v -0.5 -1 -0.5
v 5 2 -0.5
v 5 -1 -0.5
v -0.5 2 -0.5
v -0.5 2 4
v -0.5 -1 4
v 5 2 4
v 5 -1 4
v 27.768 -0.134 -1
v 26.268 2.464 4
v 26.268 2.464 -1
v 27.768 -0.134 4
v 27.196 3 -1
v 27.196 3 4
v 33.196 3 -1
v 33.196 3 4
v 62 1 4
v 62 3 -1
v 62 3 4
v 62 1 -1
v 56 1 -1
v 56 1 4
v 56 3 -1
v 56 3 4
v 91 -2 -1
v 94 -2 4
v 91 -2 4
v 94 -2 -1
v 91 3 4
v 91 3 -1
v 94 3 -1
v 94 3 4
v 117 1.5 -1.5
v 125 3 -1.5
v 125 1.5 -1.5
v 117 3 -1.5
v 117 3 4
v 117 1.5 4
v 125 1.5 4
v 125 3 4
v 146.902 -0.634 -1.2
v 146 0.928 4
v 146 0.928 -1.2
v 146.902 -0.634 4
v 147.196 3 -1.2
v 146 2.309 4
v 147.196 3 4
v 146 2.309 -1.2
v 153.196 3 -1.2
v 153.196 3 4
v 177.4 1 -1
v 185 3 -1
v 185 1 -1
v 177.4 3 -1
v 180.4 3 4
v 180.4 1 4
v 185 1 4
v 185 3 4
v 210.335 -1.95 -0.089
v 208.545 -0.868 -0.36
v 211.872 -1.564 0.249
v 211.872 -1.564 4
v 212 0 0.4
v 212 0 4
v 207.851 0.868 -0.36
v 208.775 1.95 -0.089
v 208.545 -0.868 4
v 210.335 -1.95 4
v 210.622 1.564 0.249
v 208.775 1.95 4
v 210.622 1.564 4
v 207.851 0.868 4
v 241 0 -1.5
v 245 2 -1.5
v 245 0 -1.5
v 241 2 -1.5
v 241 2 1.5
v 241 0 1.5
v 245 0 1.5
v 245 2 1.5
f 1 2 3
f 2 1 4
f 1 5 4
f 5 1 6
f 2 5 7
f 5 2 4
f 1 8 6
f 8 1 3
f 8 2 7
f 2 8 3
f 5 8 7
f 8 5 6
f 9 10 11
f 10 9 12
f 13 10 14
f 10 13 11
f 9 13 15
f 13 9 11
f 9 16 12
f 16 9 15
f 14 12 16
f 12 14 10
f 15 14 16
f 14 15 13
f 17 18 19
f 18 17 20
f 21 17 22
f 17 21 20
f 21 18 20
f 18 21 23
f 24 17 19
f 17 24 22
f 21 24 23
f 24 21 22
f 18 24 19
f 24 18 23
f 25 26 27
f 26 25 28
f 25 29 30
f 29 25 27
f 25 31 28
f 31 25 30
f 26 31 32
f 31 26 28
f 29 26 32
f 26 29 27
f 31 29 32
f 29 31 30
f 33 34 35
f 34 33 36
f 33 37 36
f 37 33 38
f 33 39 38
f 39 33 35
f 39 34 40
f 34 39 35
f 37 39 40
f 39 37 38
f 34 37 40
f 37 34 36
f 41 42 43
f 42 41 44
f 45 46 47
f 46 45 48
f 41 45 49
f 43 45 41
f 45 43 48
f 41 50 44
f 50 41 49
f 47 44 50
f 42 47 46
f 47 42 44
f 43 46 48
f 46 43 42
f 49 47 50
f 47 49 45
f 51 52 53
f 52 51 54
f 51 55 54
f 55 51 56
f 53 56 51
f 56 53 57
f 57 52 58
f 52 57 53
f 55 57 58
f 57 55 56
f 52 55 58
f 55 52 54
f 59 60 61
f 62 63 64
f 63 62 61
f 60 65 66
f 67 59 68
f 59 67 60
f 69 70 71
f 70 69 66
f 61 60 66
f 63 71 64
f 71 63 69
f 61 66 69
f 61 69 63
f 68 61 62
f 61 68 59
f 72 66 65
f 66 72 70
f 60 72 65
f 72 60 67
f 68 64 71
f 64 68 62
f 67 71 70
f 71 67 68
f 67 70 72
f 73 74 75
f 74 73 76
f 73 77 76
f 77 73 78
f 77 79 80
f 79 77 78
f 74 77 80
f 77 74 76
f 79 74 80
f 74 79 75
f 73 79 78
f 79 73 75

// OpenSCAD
// multmatrix(m) of plain numbers (affine.ts): each result is clipped by a box lopsided on every axis, so the
// clipped volume depends on the orientation, the handedness and the scale — not just the size
module block() translate([-2, 1, -1]) cube([8, 3, 6]);
module clip(at) translate([at, 0, 0]) intersection() { children(); translate([-4, -6, -3]) cube([9, 9, 7]); }
clip(0) multmatrix([[1, 0, 0, 1.5], [0, 1, 0, -2], [0, 0, 1, 0.5], [0, 0, 0, 1]]) block();       // a move
clip(30) multmatrix([[0.866025, -0.5, 0, 0], [0.5, 0.866025, 0, 0], [0, 0, 1, 0]]) block();      // rotate z 30 (as .csg prints it)
clip(60) multmatrix([[-1, 0, 0, 0], [0, 1, 0, 0], [0, 0, 1, 0]]) block();                        // mirror x
clip(90) multmatrix([[0, 1, 0, 0], [1, 0, 0, 0], [0, 0, 1, 0]]) block();                         // swap x and y: a mirror
clip(120) multmatrix([[1.5, 0, 0, 0], [0, 1.5, 0, 0], [0, 0, 1.5, 0]]) block();                  // uniform scale
clip(150) multmatrix([[1.29904, -0.5, 0, 0], [0.75, 0.866025, 0, 0], [0, 0, 1.2, 0]]) block();   // rotate · per-axis scale
clip(180) multmatrix([[1, 0, 0.6, 0], [0, 1, 0, 0], [0, 0, 1, 0]]) block();                      // shear x by z
clip(210) multmatrix([[1, 0.4, 0, 0], [0, -1, 0, 0], [0.2, 0, 1, 0]]) cylinder(h = 5, r = 2);    // shear + mirror, a curved child
clip(240) multmatrix([[2, 0, 0, 0], [0, 2, 0, 0], [0, 0, 3, 0]]) translate([0.5, 0, 0]) linear_extrude(height = 1, center = true) square([2, 1]); // Write.scad's fold
